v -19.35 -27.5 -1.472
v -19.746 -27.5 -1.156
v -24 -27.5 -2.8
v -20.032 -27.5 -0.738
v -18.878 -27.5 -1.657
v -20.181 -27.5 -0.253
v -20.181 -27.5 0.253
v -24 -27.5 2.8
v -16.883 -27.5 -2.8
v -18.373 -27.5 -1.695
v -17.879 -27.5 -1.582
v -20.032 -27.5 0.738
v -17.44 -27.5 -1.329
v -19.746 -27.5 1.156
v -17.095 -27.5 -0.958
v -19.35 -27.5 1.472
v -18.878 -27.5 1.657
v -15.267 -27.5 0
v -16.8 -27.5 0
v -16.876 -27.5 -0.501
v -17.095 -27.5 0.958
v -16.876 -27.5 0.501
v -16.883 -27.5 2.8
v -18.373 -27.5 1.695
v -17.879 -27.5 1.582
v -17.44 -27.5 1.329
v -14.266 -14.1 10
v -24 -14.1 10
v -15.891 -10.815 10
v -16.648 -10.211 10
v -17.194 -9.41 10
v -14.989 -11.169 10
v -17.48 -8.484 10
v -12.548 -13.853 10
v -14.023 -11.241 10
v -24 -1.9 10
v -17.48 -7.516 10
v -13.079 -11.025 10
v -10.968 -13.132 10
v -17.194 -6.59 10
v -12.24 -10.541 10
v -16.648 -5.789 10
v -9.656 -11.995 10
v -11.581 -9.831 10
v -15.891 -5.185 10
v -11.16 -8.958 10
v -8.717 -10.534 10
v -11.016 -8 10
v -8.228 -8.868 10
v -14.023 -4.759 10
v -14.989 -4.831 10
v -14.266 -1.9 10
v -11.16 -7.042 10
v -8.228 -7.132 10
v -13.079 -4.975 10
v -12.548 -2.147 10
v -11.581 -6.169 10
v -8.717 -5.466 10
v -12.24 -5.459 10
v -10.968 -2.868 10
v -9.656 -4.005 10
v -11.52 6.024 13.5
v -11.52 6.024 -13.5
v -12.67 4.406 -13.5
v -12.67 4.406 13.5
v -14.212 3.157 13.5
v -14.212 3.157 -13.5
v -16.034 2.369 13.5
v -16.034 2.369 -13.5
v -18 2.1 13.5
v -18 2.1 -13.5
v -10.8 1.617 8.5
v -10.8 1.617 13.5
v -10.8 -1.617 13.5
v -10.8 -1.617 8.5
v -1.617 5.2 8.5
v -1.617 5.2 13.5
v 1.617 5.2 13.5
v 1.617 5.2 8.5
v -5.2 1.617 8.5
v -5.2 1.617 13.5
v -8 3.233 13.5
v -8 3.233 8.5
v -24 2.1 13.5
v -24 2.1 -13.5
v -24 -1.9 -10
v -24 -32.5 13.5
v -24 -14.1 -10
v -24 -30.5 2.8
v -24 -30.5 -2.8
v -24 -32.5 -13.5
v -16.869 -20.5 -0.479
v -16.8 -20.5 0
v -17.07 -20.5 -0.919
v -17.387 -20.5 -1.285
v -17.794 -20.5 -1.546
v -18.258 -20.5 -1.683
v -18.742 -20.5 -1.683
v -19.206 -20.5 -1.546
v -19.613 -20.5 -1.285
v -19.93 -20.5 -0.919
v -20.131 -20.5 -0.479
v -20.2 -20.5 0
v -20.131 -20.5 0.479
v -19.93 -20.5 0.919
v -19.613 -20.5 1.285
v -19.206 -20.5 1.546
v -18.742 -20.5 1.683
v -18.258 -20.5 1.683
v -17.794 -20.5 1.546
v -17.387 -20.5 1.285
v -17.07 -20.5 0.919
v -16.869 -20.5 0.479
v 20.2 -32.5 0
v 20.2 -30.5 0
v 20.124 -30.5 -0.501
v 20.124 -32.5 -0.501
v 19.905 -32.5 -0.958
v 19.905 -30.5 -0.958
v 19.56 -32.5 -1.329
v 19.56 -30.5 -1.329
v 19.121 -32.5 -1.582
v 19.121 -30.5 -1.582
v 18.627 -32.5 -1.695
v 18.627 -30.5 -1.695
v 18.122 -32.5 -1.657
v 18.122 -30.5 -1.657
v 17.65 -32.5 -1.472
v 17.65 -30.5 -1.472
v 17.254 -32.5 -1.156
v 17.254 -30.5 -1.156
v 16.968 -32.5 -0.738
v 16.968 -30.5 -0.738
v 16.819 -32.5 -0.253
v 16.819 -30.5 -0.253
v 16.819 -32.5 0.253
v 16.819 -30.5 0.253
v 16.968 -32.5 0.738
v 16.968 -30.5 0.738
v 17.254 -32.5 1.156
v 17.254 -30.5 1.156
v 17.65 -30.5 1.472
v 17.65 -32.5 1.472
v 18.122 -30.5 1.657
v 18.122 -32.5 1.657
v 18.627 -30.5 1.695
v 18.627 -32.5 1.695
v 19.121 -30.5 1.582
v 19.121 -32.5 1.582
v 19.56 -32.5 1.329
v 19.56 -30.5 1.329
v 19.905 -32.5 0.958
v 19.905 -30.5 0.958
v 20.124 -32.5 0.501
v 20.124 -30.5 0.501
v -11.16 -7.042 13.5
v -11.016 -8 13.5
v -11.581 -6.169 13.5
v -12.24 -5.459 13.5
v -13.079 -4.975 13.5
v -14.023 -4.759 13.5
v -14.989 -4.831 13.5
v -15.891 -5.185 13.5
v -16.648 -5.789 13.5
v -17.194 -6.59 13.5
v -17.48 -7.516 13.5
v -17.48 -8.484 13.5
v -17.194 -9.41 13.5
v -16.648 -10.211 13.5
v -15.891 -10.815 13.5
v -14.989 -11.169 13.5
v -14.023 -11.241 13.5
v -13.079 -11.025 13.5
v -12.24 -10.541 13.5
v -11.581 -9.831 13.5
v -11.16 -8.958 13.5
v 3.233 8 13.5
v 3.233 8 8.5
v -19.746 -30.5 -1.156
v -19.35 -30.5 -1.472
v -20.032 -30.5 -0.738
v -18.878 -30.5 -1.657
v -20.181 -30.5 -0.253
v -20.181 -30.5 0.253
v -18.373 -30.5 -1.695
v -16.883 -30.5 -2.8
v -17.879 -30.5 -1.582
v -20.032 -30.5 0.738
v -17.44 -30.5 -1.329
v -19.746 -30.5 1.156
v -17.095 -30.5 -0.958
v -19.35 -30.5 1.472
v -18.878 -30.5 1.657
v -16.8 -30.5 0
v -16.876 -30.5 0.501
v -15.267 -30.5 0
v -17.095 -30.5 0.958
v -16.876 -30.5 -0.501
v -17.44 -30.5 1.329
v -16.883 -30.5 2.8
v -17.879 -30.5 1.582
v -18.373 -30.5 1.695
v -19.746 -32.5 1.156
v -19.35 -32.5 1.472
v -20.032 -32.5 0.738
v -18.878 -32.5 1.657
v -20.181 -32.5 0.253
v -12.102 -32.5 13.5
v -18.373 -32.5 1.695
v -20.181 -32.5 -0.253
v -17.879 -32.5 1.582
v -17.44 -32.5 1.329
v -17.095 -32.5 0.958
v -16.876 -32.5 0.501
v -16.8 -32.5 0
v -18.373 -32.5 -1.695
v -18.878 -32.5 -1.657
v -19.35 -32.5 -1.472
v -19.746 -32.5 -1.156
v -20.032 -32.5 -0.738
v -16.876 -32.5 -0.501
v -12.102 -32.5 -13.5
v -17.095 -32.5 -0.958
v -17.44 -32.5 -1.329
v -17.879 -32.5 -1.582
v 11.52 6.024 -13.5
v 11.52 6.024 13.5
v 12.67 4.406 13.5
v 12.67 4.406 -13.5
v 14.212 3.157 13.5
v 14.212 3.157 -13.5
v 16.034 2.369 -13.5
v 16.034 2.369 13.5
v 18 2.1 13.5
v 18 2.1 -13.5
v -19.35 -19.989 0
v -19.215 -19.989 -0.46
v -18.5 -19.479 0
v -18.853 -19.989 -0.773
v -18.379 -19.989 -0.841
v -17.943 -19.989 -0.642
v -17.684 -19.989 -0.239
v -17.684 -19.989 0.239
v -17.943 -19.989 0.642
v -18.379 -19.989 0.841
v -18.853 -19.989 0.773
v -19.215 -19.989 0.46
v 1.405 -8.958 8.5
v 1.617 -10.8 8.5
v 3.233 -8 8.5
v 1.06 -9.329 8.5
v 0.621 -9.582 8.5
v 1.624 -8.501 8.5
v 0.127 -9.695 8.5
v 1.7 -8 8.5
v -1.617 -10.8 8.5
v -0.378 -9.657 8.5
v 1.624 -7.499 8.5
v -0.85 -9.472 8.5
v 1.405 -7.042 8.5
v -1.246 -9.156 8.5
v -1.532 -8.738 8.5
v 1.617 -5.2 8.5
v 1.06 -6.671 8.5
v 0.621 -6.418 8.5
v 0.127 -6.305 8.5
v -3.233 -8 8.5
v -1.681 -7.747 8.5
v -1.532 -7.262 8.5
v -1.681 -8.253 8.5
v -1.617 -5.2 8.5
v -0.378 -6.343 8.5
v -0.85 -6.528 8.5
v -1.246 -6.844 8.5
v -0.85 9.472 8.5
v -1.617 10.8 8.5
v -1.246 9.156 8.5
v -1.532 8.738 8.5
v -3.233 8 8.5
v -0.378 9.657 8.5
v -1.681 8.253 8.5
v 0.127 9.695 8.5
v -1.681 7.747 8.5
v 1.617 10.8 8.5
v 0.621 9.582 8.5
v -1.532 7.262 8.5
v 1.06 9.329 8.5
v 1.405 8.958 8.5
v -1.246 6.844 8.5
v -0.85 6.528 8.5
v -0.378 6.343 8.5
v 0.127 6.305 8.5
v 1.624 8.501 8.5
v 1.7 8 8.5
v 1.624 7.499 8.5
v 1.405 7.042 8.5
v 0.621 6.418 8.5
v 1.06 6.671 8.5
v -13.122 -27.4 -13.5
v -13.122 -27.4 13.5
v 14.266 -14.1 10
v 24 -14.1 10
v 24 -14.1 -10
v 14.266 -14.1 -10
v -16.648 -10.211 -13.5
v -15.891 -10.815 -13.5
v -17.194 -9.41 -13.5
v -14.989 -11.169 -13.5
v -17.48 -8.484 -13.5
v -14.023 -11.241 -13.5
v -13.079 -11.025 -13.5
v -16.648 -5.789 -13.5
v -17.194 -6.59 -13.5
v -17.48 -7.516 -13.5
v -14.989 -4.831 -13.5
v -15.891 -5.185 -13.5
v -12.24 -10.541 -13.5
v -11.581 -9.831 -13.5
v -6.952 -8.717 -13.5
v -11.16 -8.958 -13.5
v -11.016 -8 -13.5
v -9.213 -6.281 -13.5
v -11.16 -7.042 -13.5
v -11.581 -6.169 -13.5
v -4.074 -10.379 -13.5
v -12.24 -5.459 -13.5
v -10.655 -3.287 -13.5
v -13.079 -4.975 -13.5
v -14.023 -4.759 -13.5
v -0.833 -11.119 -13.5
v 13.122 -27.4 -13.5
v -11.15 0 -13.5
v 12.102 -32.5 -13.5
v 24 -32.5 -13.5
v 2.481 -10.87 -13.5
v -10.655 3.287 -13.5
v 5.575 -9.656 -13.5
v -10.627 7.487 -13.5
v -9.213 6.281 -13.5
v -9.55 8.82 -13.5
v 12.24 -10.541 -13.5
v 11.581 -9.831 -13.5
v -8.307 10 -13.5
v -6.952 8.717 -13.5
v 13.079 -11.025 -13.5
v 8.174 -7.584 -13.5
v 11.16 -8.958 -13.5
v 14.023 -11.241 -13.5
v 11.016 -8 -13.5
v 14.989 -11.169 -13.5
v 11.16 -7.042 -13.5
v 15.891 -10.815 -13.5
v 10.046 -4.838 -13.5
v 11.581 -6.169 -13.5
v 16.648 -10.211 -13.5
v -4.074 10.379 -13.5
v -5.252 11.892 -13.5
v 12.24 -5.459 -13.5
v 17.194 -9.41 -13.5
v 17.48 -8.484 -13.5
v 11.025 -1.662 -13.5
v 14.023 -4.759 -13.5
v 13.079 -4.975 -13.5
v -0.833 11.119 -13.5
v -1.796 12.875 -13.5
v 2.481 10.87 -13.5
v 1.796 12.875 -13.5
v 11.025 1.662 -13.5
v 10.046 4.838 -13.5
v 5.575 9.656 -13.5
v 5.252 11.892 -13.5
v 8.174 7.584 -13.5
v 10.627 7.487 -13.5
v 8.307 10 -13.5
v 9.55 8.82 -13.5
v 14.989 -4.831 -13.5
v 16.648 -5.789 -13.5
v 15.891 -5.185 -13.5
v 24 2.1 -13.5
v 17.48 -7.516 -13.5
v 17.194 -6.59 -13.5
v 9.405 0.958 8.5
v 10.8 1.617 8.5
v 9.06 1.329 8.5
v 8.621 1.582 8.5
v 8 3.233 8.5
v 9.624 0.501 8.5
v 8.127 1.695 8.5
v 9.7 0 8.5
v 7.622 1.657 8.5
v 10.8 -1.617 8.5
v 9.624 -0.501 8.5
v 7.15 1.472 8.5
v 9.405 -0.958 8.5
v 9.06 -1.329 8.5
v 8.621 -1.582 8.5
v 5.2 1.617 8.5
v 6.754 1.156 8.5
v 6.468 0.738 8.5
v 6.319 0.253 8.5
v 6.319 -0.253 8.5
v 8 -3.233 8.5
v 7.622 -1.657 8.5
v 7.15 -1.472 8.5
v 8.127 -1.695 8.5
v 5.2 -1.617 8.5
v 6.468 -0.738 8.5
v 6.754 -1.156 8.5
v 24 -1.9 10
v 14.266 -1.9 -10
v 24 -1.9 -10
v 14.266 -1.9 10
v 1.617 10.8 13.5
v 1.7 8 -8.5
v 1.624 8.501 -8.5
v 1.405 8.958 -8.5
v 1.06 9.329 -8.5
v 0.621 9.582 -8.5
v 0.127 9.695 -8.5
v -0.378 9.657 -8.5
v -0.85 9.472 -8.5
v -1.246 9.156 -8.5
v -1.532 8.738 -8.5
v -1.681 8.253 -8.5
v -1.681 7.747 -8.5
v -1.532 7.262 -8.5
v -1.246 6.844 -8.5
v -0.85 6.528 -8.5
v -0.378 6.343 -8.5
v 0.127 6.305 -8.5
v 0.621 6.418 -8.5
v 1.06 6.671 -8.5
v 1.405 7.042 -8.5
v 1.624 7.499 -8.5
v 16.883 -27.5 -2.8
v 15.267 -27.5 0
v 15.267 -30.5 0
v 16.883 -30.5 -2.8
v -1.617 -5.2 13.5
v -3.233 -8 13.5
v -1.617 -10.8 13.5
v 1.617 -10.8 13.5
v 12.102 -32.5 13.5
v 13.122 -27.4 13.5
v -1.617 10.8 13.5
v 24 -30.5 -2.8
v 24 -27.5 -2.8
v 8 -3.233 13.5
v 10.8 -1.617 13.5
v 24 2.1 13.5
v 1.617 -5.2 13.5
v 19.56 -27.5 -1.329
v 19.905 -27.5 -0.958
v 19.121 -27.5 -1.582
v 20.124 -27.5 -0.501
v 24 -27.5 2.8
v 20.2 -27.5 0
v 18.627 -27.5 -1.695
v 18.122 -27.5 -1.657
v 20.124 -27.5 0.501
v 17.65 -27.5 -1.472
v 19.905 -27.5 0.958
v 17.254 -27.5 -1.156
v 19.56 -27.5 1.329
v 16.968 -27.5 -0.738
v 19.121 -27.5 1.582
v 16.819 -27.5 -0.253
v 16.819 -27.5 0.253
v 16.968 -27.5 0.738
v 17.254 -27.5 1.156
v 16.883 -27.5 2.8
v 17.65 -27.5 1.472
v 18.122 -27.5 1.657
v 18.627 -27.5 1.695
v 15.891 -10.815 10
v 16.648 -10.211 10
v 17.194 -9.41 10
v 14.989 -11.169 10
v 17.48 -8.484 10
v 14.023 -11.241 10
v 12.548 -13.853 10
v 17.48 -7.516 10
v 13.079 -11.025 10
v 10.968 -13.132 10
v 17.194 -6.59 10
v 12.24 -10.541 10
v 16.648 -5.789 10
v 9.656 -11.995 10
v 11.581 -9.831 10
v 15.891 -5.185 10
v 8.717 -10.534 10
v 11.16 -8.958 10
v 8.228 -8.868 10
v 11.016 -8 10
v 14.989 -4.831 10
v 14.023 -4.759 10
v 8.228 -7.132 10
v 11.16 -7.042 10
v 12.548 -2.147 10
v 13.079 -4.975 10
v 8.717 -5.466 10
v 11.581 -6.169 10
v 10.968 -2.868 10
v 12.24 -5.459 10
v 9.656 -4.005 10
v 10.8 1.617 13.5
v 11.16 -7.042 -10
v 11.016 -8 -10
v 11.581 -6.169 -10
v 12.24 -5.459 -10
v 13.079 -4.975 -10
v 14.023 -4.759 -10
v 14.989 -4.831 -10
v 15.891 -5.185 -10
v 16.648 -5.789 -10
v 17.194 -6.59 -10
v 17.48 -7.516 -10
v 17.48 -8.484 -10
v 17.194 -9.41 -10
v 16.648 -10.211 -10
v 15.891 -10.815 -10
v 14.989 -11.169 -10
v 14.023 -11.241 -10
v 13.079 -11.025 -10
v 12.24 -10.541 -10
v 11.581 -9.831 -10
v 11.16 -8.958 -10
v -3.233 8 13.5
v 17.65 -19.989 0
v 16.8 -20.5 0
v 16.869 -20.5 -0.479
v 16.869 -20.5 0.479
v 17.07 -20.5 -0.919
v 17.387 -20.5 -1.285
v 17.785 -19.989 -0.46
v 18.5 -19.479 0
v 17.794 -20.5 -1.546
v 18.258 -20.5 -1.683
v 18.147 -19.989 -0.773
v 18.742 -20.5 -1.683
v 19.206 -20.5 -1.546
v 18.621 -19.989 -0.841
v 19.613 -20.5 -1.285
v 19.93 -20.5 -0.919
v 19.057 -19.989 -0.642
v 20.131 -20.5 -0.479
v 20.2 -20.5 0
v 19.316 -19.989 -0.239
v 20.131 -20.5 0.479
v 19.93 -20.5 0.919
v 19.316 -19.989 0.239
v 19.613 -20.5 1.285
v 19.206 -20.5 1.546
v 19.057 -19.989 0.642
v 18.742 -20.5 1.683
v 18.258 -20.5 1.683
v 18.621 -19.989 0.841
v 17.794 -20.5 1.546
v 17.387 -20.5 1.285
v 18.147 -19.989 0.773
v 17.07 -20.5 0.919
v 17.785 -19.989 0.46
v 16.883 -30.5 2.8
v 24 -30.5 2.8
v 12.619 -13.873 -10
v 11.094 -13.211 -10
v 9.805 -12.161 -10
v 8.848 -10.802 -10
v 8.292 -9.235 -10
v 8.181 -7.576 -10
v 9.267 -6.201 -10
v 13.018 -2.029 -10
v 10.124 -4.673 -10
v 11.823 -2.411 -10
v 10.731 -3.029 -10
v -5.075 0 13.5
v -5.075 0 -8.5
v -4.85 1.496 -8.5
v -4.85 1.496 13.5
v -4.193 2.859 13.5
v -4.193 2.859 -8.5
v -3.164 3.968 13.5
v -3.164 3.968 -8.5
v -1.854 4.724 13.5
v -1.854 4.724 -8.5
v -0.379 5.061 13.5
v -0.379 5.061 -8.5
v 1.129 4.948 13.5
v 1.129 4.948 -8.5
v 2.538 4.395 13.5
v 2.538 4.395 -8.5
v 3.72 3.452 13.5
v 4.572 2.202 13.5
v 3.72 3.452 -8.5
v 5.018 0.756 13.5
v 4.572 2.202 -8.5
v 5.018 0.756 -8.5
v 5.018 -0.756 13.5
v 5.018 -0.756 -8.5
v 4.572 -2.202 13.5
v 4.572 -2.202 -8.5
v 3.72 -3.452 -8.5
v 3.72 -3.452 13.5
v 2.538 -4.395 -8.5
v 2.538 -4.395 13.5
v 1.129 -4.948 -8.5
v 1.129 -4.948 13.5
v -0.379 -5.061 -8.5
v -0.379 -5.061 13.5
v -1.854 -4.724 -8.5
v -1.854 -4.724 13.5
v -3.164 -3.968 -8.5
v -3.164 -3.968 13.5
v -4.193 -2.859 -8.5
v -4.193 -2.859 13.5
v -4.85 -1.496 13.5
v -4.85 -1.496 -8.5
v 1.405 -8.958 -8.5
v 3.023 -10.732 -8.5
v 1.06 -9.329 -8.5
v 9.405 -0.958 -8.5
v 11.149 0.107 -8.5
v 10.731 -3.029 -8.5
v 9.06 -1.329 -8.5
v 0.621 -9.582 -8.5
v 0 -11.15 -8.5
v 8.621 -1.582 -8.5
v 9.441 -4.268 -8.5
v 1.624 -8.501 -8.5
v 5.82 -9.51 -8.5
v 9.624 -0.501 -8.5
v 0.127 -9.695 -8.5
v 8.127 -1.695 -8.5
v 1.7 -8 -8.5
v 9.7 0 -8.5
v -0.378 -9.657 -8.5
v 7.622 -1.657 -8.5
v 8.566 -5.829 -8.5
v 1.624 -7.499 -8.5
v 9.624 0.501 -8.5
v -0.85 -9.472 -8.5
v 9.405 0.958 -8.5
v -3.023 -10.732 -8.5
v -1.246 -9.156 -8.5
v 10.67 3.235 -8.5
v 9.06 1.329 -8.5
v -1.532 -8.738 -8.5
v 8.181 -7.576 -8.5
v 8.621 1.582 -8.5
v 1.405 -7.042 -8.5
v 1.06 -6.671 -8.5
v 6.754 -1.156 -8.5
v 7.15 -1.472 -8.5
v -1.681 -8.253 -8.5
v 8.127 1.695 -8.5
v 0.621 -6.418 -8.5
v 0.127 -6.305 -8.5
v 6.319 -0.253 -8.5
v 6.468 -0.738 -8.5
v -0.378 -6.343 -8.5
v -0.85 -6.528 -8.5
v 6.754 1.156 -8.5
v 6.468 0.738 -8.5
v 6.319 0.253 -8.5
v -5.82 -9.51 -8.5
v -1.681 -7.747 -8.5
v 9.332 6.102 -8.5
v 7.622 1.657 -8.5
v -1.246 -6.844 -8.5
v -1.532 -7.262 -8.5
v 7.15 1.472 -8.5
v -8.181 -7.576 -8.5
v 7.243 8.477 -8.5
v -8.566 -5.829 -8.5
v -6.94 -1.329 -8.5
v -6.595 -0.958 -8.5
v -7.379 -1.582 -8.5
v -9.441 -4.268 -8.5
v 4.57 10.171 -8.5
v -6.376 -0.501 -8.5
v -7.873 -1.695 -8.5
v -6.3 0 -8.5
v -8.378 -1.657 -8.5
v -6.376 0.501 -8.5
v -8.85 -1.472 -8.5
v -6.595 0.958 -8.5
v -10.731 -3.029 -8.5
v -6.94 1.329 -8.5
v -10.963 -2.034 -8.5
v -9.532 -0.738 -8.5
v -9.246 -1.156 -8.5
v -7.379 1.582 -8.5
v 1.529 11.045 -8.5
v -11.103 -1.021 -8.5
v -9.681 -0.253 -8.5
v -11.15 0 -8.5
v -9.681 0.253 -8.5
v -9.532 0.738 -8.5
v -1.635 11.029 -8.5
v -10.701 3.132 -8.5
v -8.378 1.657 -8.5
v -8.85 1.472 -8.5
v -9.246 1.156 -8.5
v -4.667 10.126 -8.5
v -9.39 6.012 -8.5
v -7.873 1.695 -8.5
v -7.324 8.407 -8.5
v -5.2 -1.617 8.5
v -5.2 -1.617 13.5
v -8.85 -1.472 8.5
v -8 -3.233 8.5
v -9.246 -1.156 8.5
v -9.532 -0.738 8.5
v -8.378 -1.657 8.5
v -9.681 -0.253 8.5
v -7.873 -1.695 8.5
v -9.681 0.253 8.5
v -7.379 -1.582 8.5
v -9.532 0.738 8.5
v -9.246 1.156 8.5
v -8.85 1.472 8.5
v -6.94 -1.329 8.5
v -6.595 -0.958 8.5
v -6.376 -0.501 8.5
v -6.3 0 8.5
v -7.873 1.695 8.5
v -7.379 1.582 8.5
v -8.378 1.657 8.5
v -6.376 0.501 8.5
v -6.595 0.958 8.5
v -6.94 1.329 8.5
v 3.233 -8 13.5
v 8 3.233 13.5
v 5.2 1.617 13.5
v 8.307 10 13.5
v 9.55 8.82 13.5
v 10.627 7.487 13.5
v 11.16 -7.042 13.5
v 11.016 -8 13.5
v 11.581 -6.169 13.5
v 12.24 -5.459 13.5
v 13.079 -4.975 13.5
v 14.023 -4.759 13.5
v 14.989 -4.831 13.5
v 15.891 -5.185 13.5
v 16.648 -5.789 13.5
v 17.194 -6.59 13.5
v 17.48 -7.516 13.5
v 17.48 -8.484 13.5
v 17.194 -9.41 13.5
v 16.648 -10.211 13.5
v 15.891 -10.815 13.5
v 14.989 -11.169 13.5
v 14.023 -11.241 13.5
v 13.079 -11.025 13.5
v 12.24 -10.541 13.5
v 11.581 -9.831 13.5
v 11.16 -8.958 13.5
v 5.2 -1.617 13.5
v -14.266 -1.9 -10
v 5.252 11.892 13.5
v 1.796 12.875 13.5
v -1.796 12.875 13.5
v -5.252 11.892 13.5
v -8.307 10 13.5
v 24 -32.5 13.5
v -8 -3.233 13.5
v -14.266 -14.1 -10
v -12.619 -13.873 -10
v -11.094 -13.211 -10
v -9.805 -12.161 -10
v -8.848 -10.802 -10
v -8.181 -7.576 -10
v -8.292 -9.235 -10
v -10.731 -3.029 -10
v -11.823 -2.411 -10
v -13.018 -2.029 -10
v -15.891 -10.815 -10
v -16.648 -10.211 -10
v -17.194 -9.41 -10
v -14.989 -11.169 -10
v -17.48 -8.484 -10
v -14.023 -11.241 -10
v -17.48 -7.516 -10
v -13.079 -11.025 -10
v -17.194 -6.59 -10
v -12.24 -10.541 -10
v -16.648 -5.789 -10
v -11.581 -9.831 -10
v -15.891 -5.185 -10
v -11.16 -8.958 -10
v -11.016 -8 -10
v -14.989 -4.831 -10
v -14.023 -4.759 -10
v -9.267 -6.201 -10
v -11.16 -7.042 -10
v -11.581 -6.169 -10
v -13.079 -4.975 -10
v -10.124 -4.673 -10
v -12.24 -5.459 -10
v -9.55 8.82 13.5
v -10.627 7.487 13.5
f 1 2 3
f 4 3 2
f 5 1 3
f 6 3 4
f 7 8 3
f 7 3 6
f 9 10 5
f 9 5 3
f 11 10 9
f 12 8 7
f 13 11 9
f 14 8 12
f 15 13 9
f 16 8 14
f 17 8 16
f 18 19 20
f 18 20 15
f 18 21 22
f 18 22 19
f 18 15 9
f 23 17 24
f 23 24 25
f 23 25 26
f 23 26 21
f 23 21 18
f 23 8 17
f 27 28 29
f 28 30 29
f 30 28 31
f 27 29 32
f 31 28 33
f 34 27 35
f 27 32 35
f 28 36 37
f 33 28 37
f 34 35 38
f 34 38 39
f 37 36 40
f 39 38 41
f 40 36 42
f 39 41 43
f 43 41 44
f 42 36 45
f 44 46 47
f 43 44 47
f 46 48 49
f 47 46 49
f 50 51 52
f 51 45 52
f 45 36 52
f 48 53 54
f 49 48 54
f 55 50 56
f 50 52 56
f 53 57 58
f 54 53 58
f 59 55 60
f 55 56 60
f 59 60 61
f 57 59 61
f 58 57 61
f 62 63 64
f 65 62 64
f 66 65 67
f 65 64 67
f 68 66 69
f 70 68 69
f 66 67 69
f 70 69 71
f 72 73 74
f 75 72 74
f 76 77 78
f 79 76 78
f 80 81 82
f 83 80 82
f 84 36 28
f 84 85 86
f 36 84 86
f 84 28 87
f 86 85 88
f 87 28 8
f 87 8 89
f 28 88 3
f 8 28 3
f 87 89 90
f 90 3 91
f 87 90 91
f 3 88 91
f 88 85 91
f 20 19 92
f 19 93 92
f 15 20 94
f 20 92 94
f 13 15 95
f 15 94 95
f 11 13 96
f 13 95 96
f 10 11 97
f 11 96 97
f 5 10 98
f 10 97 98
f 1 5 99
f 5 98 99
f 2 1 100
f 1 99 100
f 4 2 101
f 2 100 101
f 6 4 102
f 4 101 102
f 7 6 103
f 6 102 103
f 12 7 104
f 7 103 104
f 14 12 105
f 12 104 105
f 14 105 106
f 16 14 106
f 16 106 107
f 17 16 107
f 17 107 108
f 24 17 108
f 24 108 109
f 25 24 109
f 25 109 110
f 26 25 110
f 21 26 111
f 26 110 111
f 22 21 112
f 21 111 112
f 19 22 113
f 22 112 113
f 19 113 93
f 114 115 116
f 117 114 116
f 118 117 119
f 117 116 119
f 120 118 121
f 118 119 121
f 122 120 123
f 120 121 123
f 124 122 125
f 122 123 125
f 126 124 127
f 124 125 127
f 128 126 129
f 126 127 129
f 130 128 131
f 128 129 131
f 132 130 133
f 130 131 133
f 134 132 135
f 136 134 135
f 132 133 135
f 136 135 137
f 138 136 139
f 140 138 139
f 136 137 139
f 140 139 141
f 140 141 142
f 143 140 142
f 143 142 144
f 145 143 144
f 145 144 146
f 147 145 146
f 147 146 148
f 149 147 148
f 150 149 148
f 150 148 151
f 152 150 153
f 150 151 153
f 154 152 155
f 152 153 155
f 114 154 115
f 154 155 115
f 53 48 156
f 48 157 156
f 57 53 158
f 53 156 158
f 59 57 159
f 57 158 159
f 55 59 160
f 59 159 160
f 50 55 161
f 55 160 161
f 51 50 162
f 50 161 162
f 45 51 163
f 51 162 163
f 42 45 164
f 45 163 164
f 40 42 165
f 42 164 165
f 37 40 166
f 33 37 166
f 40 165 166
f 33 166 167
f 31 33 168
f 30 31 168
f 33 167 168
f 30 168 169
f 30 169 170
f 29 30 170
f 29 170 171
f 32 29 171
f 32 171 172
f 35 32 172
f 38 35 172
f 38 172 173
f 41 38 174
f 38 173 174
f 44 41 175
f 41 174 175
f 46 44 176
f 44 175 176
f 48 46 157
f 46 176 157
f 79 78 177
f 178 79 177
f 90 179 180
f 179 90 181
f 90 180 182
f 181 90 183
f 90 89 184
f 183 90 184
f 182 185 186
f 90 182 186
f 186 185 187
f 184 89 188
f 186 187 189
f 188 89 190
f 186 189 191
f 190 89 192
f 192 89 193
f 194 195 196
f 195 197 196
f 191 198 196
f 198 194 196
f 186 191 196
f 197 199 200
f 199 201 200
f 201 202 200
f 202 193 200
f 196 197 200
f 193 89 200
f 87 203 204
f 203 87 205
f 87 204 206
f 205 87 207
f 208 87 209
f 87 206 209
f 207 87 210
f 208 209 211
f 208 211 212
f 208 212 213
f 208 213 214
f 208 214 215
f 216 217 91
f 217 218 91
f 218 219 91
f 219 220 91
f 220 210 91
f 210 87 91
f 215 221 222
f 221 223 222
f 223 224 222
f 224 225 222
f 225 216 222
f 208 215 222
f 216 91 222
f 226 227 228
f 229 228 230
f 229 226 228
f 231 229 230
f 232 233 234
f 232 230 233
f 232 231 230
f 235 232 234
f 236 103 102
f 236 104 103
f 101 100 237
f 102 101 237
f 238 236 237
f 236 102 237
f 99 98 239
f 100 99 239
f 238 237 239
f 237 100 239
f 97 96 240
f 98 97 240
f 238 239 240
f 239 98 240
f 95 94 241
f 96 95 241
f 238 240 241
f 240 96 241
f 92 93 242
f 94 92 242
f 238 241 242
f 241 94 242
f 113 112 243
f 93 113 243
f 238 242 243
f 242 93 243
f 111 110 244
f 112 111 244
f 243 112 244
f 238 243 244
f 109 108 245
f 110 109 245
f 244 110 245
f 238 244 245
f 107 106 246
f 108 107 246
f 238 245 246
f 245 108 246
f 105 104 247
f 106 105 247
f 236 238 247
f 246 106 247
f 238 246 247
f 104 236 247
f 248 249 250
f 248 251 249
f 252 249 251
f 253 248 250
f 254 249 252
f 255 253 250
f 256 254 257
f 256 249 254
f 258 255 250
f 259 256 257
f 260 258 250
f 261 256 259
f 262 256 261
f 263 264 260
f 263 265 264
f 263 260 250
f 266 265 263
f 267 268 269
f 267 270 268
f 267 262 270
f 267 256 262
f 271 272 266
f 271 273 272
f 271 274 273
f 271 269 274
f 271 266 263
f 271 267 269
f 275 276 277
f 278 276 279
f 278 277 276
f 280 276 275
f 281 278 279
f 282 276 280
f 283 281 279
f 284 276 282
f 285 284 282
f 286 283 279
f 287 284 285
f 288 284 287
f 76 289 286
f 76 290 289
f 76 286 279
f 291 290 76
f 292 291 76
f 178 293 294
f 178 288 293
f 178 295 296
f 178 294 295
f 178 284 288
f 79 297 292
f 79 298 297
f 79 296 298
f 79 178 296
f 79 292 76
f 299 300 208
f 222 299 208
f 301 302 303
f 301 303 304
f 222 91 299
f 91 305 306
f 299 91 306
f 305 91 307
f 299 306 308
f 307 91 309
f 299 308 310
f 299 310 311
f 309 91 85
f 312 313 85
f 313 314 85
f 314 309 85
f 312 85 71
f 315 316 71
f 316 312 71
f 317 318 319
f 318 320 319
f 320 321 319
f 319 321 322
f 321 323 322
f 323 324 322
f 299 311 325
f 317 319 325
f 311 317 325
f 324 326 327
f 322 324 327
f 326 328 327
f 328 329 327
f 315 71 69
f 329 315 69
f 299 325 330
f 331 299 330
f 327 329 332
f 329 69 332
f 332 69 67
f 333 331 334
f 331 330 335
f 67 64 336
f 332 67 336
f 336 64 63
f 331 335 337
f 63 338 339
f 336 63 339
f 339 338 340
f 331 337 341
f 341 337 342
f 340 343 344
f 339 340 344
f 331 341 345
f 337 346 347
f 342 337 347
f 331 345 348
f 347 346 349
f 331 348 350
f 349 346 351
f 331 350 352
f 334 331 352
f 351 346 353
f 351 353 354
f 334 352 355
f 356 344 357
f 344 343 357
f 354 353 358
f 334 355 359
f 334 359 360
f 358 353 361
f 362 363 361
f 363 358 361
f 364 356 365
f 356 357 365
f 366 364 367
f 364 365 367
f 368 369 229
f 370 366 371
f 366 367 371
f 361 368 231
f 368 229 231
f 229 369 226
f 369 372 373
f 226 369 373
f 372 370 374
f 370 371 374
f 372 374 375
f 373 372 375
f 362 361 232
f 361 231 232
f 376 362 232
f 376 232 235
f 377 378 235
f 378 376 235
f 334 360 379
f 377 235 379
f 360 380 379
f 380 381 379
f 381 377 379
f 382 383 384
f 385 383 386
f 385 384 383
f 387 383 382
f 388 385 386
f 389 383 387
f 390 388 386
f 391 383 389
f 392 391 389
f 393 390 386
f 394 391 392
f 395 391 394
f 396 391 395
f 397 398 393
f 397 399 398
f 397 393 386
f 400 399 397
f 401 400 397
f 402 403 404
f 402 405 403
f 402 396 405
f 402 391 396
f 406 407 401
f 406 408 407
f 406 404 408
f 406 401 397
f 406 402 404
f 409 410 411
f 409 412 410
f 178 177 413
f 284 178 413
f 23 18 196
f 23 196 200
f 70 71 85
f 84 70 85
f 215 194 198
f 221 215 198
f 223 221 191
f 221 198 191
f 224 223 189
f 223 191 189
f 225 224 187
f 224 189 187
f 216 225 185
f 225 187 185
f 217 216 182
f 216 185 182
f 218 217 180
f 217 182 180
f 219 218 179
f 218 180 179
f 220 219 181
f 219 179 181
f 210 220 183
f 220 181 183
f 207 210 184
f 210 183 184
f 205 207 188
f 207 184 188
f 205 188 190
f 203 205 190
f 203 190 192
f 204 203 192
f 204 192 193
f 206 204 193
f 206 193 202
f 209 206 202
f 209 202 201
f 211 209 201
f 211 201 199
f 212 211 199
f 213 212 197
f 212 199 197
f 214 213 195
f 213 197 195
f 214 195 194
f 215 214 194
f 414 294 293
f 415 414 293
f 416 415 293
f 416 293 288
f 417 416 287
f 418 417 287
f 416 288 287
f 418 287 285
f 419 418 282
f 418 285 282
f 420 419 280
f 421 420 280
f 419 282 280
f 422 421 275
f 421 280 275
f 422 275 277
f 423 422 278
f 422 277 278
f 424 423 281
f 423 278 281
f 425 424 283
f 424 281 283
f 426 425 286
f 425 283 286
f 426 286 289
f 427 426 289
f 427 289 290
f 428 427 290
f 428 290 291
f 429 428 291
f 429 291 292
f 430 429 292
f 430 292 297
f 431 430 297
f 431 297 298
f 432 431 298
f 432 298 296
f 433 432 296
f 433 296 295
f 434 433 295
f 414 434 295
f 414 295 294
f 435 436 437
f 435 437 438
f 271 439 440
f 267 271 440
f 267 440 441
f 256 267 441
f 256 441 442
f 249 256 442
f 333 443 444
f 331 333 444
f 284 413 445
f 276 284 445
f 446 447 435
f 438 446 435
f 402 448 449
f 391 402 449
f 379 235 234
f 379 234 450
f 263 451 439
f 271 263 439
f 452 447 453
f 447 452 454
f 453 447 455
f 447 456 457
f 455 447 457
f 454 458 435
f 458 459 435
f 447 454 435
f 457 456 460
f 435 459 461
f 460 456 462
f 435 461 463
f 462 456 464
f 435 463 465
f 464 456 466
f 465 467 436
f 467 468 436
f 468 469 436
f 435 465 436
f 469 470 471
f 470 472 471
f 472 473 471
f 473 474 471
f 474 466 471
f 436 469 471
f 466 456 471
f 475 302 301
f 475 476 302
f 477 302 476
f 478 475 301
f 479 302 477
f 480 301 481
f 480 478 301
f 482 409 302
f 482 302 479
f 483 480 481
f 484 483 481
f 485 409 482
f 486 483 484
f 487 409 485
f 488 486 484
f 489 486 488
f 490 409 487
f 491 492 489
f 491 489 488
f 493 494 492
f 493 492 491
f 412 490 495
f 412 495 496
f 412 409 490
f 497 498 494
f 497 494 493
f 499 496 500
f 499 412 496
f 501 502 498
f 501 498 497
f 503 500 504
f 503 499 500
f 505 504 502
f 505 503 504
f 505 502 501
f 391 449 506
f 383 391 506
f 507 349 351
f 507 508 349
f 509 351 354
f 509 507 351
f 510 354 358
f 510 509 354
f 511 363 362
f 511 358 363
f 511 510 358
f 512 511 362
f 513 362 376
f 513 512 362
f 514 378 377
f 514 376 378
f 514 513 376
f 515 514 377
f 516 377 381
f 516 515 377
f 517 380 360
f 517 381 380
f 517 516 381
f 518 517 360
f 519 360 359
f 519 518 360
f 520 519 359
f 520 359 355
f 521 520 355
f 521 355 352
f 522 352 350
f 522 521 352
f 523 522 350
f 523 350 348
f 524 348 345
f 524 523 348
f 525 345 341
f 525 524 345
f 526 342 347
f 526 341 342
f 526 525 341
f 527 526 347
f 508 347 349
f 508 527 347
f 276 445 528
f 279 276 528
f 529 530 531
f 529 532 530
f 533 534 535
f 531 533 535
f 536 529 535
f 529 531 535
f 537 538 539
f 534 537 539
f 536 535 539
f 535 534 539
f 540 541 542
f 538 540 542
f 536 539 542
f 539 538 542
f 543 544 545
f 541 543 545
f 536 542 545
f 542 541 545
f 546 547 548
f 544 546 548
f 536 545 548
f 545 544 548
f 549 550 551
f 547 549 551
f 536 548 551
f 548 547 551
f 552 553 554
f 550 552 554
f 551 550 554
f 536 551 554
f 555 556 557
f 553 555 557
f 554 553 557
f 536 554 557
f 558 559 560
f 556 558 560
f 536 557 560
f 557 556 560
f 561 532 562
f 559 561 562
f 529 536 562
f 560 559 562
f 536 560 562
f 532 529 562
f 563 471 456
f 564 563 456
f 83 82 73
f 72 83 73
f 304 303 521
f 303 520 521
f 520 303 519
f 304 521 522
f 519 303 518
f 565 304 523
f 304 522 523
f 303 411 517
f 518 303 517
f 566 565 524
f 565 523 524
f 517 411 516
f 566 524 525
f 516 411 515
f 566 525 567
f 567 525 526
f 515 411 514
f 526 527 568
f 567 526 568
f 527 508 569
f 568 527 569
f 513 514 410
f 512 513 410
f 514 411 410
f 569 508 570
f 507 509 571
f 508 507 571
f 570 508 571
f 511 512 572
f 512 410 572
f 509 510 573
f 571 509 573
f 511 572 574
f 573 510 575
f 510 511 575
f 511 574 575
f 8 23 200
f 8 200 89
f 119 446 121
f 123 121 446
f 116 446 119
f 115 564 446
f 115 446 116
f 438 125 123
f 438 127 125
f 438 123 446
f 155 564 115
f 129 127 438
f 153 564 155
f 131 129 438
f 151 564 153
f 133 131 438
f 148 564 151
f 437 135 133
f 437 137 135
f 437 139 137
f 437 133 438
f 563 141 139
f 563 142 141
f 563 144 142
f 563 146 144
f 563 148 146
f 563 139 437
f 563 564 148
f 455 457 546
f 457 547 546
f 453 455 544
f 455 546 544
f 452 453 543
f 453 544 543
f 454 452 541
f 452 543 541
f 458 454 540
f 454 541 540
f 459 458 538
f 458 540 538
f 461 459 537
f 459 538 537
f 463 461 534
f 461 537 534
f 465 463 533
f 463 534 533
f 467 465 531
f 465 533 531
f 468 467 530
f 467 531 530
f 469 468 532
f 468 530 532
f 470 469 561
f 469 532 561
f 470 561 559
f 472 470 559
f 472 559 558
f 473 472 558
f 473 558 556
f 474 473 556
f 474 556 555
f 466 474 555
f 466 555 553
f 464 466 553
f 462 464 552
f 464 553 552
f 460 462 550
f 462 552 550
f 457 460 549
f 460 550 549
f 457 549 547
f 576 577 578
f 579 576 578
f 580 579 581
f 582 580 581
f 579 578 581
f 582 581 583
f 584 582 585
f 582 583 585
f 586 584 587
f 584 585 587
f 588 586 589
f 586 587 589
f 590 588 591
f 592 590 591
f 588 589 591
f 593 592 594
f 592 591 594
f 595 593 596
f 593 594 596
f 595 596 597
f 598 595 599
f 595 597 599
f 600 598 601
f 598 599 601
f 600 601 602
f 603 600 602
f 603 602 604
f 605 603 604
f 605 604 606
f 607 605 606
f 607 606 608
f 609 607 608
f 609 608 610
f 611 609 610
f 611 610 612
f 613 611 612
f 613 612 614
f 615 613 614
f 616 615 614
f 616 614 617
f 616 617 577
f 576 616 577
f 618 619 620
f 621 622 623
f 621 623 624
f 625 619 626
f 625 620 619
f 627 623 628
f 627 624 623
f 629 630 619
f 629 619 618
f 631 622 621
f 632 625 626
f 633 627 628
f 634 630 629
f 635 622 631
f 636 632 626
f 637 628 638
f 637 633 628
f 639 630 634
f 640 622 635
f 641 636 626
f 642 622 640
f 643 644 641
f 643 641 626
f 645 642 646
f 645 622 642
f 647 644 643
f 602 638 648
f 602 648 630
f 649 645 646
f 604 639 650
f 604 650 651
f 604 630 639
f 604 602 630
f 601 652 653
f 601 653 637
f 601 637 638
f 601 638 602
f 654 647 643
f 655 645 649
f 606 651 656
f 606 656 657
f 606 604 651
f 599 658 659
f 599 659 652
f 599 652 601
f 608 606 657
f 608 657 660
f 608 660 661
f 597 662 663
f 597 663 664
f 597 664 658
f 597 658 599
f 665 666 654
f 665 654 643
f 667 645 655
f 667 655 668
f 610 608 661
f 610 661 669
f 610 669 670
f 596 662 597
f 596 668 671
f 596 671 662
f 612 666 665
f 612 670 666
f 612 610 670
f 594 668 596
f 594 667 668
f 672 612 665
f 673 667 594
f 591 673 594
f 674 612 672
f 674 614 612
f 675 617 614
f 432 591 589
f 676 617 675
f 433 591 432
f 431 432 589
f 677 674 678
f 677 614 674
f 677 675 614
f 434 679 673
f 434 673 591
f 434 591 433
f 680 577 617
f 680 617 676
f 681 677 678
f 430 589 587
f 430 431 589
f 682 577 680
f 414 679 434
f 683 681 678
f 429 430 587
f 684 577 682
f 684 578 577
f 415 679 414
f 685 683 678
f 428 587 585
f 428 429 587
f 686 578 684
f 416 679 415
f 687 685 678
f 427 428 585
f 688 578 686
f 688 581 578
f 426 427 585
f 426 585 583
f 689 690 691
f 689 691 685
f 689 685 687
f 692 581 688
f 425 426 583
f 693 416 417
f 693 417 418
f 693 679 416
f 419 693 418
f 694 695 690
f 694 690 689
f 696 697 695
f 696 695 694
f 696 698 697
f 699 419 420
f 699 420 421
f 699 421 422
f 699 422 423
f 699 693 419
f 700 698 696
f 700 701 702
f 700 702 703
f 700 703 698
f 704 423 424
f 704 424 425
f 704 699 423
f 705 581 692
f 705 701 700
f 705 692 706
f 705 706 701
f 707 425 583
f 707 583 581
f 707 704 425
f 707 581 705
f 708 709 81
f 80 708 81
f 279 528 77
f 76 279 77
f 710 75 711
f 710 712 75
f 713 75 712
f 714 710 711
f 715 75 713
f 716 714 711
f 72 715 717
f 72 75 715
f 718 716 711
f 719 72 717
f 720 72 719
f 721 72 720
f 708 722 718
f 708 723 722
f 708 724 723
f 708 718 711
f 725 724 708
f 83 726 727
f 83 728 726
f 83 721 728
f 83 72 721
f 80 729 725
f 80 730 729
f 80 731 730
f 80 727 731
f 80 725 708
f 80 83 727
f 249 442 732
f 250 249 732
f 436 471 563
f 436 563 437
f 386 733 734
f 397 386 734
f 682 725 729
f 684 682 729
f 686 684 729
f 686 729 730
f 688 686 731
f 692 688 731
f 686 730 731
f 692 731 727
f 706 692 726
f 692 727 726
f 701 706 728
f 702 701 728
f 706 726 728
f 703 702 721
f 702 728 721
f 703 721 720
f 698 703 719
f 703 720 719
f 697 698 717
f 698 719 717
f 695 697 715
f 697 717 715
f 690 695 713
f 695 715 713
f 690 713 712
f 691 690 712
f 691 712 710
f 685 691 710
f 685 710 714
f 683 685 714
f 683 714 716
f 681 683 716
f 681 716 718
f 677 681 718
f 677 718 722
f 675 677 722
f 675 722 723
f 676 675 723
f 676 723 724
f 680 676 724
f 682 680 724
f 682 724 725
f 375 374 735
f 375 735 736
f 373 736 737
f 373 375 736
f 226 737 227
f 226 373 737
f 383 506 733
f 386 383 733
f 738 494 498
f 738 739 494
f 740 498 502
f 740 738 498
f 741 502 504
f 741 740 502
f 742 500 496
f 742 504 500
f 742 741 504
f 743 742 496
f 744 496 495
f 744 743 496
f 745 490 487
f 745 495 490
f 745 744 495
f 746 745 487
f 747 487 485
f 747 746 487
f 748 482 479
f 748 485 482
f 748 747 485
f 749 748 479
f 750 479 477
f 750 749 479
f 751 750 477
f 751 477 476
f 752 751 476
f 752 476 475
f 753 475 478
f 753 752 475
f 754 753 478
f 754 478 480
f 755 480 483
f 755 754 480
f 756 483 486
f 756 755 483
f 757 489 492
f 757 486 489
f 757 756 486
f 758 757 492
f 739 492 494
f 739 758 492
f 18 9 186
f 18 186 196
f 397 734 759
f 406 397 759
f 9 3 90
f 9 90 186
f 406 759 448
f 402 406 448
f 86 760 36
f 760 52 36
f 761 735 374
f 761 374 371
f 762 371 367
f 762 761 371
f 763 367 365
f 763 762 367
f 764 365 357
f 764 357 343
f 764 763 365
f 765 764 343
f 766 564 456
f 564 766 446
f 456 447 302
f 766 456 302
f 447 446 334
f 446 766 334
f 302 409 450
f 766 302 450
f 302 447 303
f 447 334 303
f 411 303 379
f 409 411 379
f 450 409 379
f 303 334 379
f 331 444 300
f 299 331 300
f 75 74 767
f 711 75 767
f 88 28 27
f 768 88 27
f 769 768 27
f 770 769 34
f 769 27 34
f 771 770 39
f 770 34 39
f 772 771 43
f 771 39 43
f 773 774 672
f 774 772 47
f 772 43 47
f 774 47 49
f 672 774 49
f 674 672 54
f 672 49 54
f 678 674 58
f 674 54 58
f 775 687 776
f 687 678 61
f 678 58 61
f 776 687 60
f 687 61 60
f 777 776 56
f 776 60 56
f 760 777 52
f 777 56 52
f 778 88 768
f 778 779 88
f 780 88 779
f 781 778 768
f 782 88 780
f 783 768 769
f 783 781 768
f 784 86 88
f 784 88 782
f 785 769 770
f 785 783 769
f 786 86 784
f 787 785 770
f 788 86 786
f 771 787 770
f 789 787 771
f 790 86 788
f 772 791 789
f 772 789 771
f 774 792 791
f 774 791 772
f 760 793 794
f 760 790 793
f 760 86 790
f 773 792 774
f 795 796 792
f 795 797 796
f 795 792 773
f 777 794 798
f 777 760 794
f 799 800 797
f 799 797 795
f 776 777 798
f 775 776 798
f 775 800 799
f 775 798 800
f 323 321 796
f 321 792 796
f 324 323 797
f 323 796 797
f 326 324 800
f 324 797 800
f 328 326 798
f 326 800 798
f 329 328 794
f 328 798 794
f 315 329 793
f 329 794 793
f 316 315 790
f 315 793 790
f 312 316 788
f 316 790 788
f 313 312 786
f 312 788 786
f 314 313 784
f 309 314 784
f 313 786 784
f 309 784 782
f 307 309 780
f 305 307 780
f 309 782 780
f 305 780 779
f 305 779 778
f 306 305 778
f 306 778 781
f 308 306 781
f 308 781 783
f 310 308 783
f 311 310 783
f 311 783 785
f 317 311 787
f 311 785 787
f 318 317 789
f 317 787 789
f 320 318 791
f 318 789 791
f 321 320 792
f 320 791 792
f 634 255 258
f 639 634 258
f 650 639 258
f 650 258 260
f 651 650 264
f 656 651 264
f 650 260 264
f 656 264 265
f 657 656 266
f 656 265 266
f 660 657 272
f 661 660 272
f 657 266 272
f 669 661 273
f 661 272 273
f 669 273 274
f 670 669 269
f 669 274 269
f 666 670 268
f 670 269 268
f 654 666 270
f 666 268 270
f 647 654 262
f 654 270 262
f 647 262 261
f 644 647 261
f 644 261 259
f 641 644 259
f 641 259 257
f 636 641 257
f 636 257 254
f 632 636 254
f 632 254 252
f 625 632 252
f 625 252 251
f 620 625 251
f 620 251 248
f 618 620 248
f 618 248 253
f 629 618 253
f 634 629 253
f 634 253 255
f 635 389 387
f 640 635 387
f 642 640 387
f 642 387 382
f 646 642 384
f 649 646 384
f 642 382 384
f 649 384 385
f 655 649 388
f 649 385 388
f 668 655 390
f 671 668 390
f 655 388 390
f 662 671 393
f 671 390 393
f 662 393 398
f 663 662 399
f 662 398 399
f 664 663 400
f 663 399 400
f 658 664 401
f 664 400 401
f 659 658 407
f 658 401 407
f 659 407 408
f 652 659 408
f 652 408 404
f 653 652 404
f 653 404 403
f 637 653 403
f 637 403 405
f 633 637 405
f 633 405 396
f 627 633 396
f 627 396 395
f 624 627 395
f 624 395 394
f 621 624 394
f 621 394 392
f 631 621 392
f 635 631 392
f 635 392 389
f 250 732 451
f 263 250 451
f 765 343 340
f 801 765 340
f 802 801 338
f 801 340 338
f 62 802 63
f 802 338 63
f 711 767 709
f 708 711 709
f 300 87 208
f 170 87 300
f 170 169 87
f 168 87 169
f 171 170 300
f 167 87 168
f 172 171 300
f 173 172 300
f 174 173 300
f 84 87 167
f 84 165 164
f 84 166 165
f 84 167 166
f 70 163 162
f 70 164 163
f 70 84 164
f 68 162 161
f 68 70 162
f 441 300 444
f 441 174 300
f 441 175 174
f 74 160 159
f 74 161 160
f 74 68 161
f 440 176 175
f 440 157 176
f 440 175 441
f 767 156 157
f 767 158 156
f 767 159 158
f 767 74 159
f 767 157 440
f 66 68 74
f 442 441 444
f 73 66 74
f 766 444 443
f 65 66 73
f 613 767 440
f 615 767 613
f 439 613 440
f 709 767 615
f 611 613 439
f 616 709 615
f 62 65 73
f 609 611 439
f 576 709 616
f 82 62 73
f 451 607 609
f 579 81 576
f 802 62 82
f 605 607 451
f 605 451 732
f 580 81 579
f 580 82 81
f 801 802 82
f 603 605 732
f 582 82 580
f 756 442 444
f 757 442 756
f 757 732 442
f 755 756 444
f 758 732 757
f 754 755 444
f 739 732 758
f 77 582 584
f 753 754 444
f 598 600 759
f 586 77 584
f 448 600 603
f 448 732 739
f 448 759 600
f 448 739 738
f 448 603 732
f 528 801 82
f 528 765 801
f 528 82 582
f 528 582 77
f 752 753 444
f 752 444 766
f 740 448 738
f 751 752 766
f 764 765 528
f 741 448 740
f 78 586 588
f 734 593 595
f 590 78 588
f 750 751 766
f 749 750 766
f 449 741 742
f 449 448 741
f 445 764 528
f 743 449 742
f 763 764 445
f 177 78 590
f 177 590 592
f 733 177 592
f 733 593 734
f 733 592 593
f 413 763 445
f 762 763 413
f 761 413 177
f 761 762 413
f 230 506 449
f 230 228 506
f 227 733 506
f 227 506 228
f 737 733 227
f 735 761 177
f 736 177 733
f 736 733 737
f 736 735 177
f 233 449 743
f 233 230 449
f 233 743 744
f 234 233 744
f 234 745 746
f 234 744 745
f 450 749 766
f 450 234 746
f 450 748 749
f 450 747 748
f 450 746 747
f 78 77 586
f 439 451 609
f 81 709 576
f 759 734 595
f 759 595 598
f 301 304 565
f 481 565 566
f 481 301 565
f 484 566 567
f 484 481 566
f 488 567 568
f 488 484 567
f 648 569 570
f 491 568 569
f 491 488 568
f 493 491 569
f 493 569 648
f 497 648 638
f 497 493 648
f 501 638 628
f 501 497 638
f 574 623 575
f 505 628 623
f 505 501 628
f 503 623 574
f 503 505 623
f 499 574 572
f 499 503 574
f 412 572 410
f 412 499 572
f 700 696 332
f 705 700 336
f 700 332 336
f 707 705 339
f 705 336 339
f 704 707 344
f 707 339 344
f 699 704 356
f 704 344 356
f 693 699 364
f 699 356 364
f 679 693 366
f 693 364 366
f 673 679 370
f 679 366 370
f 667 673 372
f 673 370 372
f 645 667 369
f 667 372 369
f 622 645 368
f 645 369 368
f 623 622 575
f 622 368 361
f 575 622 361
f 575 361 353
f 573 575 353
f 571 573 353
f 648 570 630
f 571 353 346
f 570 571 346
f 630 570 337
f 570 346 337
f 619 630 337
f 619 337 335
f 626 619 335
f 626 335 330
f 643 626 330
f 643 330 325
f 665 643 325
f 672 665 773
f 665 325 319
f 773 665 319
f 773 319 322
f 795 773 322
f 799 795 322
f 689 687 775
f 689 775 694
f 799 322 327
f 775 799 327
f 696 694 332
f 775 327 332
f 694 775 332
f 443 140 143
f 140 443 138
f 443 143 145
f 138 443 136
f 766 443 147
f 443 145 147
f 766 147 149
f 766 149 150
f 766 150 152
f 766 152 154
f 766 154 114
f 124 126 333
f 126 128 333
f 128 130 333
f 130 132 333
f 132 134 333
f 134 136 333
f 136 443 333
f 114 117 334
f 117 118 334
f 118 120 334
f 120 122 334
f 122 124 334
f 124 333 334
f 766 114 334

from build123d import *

# Parameters (mm, degrees)
SKETCH1_R                = 13
SKETCH1_W                = 48
SKETCH1_H                = 8
BOSS_EXTRUDE1_DEPTH      = 13.5
SKETCH2_R                = 11.15
CUT_EXTRUDE1_DEPTH       = 5
SKETCH2_3_R              = 5.075
CUT_EXTRUDE2_DEPTH       = 41.360872141
SKETCH3_R                = 6.1
CUT_EXTRUDE3_DEPTH       = 10
CUT_EXTRUDE4_DEPTH       = 41.360872141
SKETCH5_R                = 3.25
CUT_EXTRUDE5_DEPTH       = 33.897568299
M3_CLEARANCE_HOLE1_D     = 3.4
CUT_EXTRUDE6_DEPTH       = 5
CIRPATTERN1_COUNT        = 4
BOSS_EXTRUDE2_START      = -13.5
BOSS_EXTRUDE2_DEPTH      = 27
M3_CLEARANCE_HOLE2_D     = 3.4
M3_CLEARANCE_HOLE2_DEPTH = 12
M3_CLEARANCE_HOLE2_TIP   = 1.021463052
CUT_EXTRUDE7_START       = -5
SKETCH12_R               = 1.7
CUT_EXTRUDE7_DEPTH       = 3
CUT_EXTRUDE8_DEPTH       = 49.592694924


with BuildPart() as part:
    # Sketch1 → Boss-Extrude1 (new, symmetric)
    with BuildSketch(Plane.XY):
        with BuildLine():
            ThreePointArc((-8.306623863, 10), (-13, 0), (-8.306623863, -10))
            Line((-8.306623863, -10), (8.306623863, -10))
            ThreePointArc((8.306623863, -10), (11.768307232, -5.523309234), (13, 0))
            ThreePointArc((13, 0), (11.768307232, 5.523309234), (8.306623863, 10))
            Line((8.306623863, 10), (-8.306623863, 10))
        make_face()
        with BuildLine():
            ThreePointArc((8.306623863, 10), (0, 13), (-8.306623863, 10))
            Line((-8.306623863, 10), (8.306623863, 10))
        make_face()
        with BuildLine():
            ThreePointArc((13, 0), (11.768307232, -5.523309234), (8.306623863, -10))
            Line((8.306623863, -10), (24, -10))
            Line((24, -10), (24, 10))
            Line((24, 10), (8.306623863, 10))
            ThreePointArc((8.306623863, 10), (11.768307232, 5.523309234), (13, 0))
        make_face()
        with BuildLine():
            Line((8.306623863, -10), (-8.306623863, -10))
            ThreePointArc((-8.306623863, -10), (0, -13), (8.306623863, -10))
        make_face()
        with BuildLine():
            Line((-24, 10), (-24, -10))
            Line((-24, -10), (-8.306623863, -10))
            ThreePointArc((-8.306623863, -10), (-13, 0), (-8.306623863, 10))
            Line((-8.306623863, 10), (-24, 10))
        make_face()
        Circle(SKETCH1_R)
        with Locations((0, -14)):
            Rectangle(SKETCH1_W, SKETCH1_H)
    extrude(amount=BOSS_EXTRUDE1_DEPTH, both=True)

    # Sketch2 → Cut-Extrude1 (cut)
    with BuildSketch(Plane(origin=(0, 0, -13.5), x_dir=(-1, 0, 0), z_dir=(0, 0, -1))):
        Circle(SKETCH2_R)
    extrude(amount=-CUT_EXTRUDE1_DEPTH, mode=Mode.SUBTRACT)

    # Sketch2<3> → Cut-Extrude2 (cut, through all)
    with BuildSketch(Plane(origin=(0, 0, -13.5), x_dir=(-1, 0, 0), z_dir=(0, 0, -1))):
        Circle(SKETCH2_3_R)
    extrude(amount=-CUT_EXTRUDE2_DEPTH, mode=Mode.SUBTRACT)

    # Sketch3 → Cut-Extrude3 (cut, symmetric)
    with BuildSketch(Plane.XY):
        with Locations((-14.26606865, -8)):
            Circle(SKETCH3_R)
        with BuildLine():
            ThreePointArc((-14.26606865, -14.1), (-20.36606865, -8), (-14.26606865, -1.9))
            Line((-14.26606865, -1.9), (-24, -1.9))
            Line((-24, -1.9), (-24, -14.1))
            Line((-24, -14.1), (-14.26606865, -14.1))
        make_face()
    cut_extrude3 = extrude(amount=CUT_EXTRUDE3_DEPTH, both=True, mode=Mode.SUBTRACT)

    # Sketch4 → Cut-Extrude4 (cut, through all)
    with BuildSketch(Plane(origin=(0, 0, -13.5), x_dir=(-1, 0, 0), z_dir=(0, 0, -1))):
        with BuildLine():
            Line((18, 2.1), (24, 2.1))
            Line((24, 2.1), (24, 10))
            Line((24, 10), (8.306623863, 10))
            ThreePointArc((8.306623863, 10), (10.1107181, 8.171497996), (11.520065039, 6.023960615))
            ThreePointArc((11.520065039, 6.023960615), (14.212288818, 3.157449424), (18, 2.1))
        make_face()
    cut_extrude4 = extrude(amount=-CUT_EXTRUDE4_DEPTH, mode=Mode.SUBTRACT)

    # Sketch5 → Cut-Extrude5 (cut, symmetric)
    with BuildSketch(Plane.XY):
        with Locations((-14.26606865, -8)):
            Circle(SKETCH5_R)
    cut_extrude5 = extrude(amount=CUT_EXTRUDE5_DEPTH, both=True, mode=Mode.SUBTRACT)

    # Mirror1: Cut-Extrude3, Cut-Extrude4, Cut-Extrude5 across plane
    add(cut_extrude3.mirror(Plane(origin=(0, 0, 0), x_dir=(0, 0, 1), z_dir=(1, 0, 0))), mode=Mode.SUBTRACT)
    add(cut_extrude4.mirror(Plane(origin=(0, 0, 0), x_dir=(0, 0, 1), z_dir=(1, 0, 0))), mode=Mode.SUBTRACT)
    add(cut_extrude5.mirror(Plane(origin=(0, 0, 0), x_dir=(0, 0, 1), z_dir=(1, 0, 0))), mode=Mode.SUBTRACT)

    # M3 Clearance Hole1 (through all)
    with Locations(Plane(origin=(0, 0, -8.5), x_dir=(-1, 0, 0), z_dir=(0, 0, -1))):
        with Locations((0, -8), (-8, 0), (0, 8), (8, 0)):
            Hole(M3_CLEARANCE_HOLE1_D / 2)

    # Sketch8 → Cut-Extrude6 (cut)
    with BuildSketch(Plane.XY.offset(13.5)):
        Polygon((-10.8, -1.616580754), (-8, -3.233161507), (-5.2, -1.616580754), (-5.2, 1.616580754), (-8, 3.233161507), (-10.8, 1.616580754), align=None)
    cut_extrude6 = extrude(amount=-CUT_EXTRUDE6_DEPTH, mode=Mode.SUBTRACT)

    # CirPattern1: Cut-Extrude6 ×4 about axis
    cirpattern1_axis = Axis((0, 0, 0), (0, 0, 1))
    for i in range(1, CIRPATTERN1_COUNT):
        add(cut_extrude6.rotate(cirpattern1_axis, i * 360 / CIRPATTERN1_COUNT), mode=Mode.SUBTRACT)

    # Sketch9 → Boss-Extrude2 (add)
    with BuildSketch(Plane.XY.offset(BOSS_EXTRUDE2_START)):
        Polygon((12, -32.5), (24, -32.5), (24, -18), (-24, -18), (-24, -32.5), (-12, -32.5), (-13, -27.5), (13, -27.5), align=None)
    extrude(amount=BOSS_EXTRUDE2_DEPTH)

    # M3 Clearance Hole2
    with Locations(Plane(origin=(0, -32.5, 0), x_dir=(-1, 0, 0), z_dir=(0, -1, 0))):
        with Locations((-18.5, 0), (18.5, 0)):
            Hole(M3_CLEARANCE_HOLE2_D / 2, depth=M3_CLEARANCE_HOLE2_DEPTH)
            with Locations((0, 0, -(M3_CLEARANCE_HOLE2_DEPTH + M3_CLEARANCE_HOLE2_TIP / 2))):  # 118° drill point
                Cone(0, M3_CLEARANCE_HOLE2_D / 2, M3_CLEARANCE_HOLE2_TIP, mode=Mode.SUBTRACT)

    # Sketch12 → Cut-Extrude7 (cut)
    # profile 1 of 4: a face of its own
    with BuildSketch(Plane.XZ.offset(32.5).offset(CUT_EXTRUDE7_START)):
        Polygon((20.116580754, -2.8), (21.733161507, 0), (20.116580754, 2.8), (16.883419246, 2.8), (15.266838493, 0), (16.883419246, -2.8), align=None)
    # profile 2 of 4: a face of its own
    with BuildSketch(Plane.XZ.offset(32.5).offset(CUT_EXTRUDE7_START)):
        Polygon((24, -2.8), (20.116580754, -2.8), (21.733161507, 0), (20.116580754, 2.8), (24, 2.8), align=None)
    # profile 3 of 4: a face of its own
    with BuildSketch(Plane.XZ.offset(32.5).offset(CUT_EXTRUDE7_START)):
        Polygon((-15.266838493, 0), (-16.883419246, 2.8), (-20.116580754, 2.8), (-21.733161507, 0), (-20.116580754, -2.8), (-16.883419246, -2.8), align=None)
        with Locations(Location((-18.5, 0, 0), (0, 0, 270))):
            Circle(SKETCH12_R, mode=Mode.SUBTRACT)
    # profile 4 of 4: a face of its own
    with BuildSketch(Plane.XZ.offset(32.5).offset(CUT_EXTRUDE7_START)):
        Polygon((-21.733161507, 0), (-20.116580754, 2.8), (-24, 2.8), (-24, -2.8), (-20.116580754, -2.8), align=None)
    extrude(amount=CUT_EXTRUDE7_DEPTH, mode=Mode.SUBTRACT)

    # Sketch13 → Cut-Extrude8 (cut, through all)
    with BuildSketch(Plane.XY.offset(13.5)):
        Polygon((-12.098058068, -32.519611614), (12.098058068, -32.519611614), (13.12198039, -27.4), (-13.12198039, -27.4), align=None)
    extrude(amount=-CUT_EXTRUDE8_DEPTH, mode=Mode.SUBTRACT)


solid = part.part
